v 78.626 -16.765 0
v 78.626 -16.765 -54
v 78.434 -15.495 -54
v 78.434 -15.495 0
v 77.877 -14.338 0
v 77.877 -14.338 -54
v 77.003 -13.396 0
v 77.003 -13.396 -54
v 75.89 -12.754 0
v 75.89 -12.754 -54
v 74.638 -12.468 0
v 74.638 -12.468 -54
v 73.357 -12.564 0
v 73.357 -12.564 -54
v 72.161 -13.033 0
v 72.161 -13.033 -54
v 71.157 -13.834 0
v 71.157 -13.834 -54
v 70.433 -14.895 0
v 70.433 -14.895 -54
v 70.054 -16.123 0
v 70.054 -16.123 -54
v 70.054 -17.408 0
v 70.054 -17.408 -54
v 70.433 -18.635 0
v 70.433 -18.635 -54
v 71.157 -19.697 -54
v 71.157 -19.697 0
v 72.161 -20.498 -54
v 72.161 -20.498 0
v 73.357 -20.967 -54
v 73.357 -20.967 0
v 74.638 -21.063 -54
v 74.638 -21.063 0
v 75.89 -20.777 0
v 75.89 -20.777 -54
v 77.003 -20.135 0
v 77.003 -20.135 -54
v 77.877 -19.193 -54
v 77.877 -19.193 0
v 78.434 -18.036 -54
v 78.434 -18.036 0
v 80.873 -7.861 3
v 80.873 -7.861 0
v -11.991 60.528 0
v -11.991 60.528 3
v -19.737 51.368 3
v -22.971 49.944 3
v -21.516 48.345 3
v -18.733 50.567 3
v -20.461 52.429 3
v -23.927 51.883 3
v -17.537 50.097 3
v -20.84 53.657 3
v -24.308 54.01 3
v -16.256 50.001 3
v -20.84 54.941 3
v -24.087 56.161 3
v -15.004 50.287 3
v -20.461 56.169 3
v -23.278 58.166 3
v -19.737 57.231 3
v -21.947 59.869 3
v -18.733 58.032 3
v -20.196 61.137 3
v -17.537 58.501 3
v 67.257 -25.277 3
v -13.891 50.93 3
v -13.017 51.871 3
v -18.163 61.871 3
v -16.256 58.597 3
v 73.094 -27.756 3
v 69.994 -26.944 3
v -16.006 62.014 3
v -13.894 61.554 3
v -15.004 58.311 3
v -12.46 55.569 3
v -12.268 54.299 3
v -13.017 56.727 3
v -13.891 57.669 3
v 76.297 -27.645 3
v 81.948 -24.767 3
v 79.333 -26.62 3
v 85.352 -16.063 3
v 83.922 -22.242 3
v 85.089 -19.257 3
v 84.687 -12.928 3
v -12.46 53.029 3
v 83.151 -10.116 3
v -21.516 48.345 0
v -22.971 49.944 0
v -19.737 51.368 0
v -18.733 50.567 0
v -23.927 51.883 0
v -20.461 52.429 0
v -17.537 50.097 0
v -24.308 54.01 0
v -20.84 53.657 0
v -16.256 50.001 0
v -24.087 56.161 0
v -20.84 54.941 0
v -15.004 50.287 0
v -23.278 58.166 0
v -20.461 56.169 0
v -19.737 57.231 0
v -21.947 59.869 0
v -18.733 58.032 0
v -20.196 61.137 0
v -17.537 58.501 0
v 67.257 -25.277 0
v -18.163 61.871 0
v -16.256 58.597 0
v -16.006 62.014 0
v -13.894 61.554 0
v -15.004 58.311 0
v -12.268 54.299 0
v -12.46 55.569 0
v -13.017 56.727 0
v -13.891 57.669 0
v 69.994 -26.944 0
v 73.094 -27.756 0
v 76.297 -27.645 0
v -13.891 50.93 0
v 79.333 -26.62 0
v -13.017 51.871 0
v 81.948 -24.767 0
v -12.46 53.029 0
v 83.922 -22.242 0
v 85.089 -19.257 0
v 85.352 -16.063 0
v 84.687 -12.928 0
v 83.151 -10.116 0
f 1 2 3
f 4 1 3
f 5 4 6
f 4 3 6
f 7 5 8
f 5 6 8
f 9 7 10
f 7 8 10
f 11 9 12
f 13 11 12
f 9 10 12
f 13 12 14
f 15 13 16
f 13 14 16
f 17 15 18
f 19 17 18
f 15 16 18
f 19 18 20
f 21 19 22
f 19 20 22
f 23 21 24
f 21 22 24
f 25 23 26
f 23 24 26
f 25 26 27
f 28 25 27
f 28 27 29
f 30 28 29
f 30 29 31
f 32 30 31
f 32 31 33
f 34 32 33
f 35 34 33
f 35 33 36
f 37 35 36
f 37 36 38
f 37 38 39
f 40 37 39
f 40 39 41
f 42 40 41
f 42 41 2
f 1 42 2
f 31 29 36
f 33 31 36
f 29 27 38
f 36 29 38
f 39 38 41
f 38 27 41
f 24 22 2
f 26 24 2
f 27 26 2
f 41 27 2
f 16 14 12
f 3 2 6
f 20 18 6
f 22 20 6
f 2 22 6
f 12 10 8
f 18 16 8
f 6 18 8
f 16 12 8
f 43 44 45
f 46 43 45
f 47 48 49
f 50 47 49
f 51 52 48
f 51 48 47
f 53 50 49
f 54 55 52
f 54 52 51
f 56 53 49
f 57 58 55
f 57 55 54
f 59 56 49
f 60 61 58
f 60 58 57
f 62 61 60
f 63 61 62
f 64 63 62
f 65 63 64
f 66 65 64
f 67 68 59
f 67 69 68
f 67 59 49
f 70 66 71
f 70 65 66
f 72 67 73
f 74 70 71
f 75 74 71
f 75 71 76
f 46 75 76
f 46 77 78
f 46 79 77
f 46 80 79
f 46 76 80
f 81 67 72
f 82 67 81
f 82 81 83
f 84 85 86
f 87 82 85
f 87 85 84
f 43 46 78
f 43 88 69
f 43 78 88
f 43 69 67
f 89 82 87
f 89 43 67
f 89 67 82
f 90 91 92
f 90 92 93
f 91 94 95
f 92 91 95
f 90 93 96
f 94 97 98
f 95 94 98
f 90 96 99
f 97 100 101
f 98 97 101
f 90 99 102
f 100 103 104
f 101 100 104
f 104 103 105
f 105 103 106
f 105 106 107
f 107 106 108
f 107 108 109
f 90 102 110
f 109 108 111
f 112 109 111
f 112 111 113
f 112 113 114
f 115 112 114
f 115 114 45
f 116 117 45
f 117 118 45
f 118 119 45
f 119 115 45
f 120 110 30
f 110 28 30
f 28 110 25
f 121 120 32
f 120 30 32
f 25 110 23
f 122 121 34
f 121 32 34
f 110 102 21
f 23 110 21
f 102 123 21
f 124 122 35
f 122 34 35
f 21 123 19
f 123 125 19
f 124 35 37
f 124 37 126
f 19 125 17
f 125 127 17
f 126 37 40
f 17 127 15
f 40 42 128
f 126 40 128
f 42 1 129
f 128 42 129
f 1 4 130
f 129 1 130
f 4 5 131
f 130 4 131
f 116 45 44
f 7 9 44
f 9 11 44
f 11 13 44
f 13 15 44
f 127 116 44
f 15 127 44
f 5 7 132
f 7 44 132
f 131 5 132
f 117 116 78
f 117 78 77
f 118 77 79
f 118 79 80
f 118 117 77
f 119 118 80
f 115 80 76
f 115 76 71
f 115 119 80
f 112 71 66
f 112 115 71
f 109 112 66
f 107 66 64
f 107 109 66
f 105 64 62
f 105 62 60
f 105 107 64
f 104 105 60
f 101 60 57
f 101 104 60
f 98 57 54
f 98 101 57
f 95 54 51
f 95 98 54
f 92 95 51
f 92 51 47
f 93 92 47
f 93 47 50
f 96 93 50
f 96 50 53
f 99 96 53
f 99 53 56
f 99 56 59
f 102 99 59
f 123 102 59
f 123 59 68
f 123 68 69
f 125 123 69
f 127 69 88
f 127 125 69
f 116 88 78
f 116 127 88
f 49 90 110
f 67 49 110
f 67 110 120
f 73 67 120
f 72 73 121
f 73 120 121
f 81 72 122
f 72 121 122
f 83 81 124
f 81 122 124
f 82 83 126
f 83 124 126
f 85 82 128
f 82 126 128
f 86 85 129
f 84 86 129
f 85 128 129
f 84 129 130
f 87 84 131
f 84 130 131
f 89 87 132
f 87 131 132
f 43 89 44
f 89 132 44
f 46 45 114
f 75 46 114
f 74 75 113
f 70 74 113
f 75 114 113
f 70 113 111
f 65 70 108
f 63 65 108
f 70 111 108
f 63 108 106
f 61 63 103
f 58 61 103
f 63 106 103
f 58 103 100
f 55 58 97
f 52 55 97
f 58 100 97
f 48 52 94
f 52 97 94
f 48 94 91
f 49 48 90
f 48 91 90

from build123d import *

# Parameters (mm, degrees)
EXTRUDE1_OUTLINE_R = 4.309736146
EXTRUDE1_DEPTH     = 3
EXTRUDE2_START     = -57
SKETCH2_R          = 4.309736146
EXTRUDE2_DEPTH     = 57


# Read off the part's stored shape, not the designer's step: Extrude1
with BuildPart() as part:
    # Extrude1 outline → Extrude1 (new body)
    with BuildSketch(Plane.XY):
        with BuildLine():
            ThreePointArc((-11.990836263, 60.528054794), (-22.672294112, 59.063871996), (-21.516296681, 48.344681589))
            Line((-21.516296681, 48.344681589), (67.256693566, -25.277180433))
            ThreePointArc((67.256693566, -25.277180433), (83.02731963, -23.576417361), (80.873138344, -7.861305383))
            Line((80.873138344, -7.861305383), (-11.990836263, 60.528054794))
        make_face()
        with Locations((74.315769624, -16.765370586)):
            Circle(EXTRUDE1_OUTLINE_R, mode=Mode.SUBTRACT)
        with Locations((-16.578080379, 54.299165973)):
            Circle(EXTRUDE1_OUTLINE_R, mode=Mode.SUBTRACT)
    extrude(amount=EXTRUDE1_DEPTH)

    # Sketch2 → Extrude2 (add)
    with BuildSketch(Plane.XY.offset(3).offset(EXTRUDE2_START)):
        with Locations((74.315769624, -16.765370586)):
            Circle(SKETCH2_R)
    extrude(amount=EXTRUDE2_DEPTH)


solid = part.part
